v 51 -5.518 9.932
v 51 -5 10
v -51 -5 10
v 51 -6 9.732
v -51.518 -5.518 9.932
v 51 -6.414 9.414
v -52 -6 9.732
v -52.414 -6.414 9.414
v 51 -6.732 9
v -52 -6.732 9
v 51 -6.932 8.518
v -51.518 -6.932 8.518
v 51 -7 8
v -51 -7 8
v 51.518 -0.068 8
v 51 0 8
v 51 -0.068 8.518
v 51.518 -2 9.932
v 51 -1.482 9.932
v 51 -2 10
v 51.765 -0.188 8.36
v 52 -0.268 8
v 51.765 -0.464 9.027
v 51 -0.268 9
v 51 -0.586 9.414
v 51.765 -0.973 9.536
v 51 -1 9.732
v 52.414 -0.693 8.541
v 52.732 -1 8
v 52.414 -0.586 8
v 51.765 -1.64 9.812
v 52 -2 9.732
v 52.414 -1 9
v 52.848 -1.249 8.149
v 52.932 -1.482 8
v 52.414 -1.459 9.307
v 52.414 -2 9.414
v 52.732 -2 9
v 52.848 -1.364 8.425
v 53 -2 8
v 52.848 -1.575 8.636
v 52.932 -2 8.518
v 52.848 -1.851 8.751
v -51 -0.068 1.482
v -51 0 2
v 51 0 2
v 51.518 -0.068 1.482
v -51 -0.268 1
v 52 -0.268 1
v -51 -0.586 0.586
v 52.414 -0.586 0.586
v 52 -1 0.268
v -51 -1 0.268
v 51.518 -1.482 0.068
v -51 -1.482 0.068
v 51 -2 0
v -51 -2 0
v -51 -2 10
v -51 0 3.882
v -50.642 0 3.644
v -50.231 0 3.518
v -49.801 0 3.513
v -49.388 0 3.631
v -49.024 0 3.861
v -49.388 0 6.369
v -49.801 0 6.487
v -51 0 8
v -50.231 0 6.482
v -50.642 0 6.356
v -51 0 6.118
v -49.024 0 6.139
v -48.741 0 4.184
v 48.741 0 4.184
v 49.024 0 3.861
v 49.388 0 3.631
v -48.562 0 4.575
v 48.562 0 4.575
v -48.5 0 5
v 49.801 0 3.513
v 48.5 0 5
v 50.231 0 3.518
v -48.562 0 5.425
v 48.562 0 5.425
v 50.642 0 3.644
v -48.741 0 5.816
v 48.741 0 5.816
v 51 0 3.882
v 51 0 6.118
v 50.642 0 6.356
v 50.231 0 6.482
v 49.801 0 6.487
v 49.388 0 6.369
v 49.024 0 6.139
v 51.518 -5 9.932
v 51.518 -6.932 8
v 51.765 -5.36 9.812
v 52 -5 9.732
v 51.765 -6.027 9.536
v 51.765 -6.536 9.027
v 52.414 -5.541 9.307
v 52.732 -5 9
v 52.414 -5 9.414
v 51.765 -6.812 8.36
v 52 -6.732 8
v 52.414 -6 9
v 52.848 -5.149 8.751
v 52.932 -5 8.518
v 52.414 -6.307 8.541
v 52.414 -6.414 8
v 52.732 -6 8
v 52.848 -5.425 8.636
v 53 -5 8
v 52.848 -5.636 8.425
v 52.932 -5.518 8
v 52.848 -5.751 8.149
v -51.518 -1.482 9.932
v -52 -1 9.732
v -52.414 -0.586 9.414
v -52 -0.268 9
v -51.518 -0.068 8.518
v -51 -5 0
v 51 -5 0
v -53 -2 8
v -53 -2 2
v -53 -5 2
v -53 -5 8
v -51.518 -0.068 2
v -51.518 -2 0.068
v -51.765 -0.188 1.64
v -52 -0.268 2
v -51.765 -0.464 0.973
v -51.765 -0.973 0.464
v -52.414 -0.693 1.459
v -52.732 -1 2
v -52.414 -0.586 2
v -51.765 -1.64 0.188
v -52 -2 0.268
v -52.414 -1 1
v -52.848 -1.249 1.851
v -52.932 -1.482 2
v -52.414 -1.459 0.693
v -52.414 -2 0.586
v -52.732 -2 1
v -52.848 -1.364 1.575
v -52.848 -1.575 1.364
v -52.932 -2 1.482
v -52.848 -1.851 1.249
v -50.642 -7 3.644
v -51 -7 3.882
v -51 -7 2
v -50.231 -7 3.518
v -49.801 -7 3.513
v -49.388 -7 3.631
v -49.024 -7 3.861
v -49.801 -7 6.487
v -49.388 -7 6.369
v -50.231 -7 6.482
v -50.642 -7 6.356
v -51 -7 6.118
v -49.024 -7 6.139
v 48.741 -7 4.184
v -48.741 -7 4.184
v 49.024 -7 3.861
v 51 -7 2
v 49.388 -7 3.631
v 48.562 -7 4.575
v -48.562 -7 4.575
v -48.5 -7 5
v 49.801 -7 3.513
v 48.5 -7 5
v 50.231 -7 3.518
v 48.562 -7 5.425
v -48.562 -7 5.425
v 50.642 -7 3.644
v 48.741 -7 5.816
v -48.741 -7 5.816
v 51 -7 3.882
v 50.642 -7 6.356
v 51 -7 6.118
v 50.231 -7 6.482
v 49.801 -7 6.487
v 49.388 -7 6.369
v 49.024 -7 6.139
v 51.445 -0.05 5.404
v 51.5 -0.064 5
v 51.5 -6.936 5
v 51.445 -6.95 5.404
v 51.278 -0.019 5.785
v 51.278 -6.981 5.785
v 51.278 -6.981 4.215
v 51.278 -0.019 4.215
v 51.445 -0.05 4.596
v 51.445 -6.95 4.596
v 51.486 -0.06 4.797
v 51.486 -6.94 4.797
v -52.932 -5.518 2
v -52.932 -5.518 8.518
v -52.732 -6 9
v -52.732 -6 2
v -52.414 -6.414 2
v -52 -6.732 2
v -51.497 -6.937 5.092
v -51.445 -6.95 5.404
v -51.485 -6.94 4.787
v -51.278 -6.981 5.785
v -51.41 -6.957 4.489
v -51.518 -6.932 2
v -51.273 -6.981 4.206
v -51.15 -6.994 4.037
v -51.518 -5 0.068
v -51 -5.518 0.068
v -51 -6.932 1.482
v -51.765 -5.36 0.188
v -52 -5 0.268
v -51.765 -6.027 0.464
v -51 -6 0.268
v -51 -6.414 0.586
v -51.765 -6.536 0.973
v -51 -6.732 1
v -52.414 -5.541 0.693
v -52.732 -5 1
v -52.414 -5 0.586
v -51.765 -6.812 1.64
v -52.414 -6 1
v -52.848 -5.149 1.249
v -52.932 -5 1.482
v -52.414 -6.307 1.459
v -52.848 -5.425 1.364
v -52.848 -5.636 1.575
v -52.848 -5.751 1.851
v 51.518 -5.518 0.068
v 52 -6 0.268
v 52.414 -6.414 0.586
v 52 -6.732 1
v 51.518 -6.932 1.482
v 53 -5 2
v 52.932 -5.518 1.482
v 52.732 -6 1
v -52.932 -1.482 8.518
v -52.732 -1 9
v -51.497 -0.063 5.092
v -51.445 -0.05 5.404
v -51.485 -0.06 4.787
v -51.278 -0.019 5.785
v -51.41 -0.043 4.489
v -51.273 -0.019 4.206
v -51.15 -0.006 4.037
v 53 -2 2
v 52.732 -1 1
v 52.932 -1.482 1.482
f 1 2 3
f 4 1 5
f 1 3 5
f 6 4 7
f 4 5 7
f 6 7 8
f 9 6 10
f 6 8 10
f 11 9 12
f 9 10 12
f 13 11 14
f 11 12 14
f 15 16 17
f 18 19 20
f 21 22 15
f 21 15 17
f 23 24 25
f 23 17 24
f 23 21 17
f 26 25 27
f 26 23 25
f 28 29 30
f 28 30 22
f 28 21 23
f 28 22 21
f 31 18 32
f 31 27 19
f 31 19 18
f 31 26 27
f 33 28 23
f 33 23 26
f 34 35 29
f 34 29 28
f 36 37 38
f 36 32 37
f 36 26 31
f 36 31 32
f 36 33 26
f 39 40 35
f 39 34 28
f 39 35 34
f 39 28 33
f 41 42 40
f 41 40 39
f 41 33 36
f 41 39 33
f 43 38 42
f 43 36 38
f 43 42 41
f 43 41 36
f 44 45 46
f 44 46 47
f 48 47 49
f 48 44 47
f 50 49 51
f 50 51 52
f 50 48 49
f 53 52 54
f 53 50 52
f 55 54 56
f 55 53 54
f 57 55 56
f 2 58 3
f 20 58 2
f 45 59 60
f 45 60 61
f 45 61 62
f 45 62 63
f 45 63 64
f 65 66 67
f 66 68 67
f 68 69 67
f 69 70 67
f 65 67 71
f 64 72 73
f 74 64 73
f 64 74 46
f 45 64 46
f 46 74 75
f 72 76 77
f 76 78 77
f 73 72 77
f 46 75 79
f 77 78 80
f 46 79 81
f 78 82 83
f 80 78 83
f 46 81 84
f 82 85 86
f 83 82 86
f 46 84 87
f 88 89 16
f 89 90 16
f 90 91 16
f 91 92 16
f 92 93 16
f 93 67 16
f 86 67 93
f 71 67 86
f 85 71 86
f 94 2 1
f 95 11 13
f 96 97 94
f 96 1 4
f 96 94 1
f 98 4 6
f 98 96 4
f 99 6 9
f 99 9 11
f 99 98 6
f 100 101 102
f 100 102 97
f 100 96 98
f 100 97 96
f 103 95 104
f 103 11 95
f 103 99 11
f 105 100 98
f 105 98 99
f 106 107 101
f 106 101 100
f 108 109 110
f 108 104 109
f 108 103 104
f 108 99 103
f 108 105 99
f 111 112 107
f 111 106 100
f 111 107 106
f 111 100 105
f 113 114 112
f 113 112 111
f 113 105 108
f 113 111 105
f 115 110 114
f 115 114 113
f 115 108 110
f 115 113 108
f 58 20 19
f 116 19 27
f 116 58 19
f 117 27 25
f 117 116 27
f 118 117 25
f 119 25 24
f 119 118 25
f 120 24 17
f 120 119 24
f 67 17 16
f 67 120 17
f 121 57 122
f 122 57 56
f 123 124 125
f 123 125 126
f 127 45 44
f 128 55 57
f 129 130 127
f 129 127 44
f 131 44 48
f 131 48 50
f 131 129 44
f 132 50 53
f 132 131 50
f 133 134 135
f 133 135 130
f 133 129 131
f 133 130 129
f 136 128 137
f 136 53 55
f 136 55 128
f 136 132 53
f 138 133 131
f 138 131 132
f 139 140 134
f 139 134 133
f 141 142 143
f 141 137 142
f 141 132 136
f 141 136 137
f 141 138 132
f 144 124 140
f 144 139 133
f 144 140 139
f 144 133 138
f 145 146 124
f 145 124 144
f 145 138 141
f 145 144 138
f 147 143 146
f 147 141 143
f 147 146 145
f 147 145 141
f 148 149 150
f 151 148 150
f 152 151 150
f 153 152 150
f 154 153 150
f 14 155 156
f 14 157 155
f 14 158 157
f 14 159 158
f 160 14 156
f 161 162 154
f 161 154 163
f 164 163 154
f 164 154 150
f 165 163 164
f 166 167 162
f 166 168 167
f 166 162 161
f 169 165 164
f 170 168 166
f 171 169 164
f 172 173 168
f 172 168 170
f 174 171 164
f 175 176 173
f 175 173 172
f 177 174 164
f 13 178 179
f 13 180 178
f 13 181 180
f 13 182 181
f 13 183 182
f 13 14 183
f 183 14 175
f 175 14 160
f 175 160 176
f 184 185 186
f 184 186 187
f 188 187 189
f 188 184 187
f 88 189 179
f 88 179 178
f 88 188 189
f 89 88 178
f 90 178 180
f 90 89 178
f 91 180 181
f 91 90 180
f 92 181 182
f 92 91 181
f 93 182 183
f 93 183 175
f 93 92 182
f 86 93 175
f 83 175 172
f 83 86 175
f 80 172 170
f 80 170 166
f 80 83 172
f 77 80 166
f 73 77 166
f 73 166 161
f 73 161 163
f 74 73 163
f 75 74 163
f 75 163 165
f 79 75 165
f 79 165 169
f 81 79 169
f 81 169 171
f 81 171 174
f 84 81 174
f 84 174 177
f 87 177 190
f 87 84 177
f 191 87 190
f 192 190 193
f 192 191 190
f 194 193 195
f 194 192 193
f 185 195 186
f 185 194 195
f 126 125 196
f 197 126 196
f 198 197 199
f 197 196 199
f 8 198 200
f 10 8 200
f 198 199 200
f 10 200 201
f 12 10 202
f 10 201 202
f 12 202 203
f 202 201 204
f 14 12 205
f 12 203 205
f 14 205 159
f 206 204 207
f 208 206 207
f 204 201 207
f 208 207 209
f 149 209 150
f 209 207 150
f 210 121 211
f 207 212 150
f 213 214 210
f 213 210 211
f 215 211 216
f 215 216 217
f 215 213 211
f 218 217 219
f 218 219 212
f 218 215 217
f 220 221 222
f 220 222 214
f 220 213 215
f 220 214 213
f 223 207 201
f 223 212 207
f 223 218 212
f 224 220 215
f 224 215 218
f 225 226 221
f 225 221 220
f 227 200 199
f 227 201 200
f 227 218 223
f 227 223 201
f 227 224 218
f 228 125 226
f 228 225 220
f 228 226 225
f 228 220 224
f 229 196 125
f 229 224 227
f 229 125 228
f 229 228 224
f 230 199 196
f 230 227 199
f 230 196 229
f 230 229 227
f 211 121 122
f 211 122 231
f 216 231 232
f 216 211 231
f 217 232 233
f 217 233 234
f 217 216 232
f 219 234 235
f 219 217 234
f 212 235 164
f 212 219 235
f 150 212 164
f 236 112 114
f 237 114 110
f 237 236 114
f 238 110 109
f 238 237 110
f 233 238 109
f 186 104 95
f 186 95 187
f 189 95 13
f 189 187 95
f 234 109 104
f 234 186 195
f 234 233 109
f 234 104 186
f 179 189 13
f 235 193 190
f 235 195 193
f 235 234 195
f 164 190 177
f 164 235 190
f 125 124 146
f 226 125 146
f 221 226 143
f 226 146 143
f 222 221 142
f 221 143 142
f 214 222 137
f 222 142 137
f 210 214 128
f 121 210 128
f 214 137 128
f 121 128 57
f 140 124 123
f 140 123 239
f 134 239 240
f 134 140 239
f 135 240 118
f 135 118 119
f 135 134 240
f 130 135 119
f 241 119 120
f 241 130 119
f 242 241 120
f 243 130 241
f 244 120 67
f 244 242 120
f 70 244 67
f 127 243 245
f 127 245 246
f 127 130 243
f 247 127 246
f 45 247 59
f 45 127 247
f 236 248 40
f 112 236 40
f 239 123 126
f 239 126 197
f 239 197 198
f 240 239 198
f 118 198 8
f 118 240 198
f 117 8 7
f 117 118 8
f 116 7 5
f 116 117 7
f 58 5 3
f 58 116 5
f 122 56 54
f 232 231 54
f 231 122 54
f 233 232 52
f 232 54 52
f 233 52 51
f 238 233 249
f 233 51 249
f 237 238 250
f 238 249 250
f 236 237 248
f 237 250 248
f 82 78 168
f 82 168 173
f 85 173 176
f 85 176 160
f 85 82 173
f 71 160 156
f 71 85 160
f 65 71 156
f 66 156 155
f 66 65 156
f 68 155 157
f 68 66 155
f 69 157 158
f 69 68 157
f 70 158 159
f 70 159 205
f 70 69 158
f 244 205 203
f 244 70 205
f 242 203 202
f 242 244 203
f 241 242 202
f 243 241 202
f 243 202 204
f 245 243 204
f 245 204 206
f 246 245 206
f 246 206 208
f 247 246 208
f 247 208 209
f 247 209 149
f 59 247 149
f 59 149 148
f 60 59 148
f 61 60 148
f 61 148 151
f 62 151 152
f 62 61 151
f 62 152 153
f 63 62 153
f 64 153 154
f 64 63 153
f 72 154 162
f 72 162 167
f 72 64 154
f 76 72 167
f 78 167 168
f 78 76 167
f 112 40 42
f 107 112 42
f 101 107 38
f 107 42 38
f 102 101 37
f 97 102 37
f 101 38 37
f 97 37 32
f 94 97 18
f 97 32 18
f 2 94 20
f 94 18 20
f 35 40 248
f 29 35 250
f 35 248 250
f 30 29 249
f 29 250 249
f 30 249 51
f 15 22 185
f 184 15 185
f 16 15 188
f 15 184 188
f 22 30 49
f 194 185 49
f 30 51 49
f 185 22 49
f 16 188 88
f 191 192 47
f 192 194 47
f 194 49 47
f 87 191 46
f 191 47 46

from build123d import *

# Parameters (mm, degrees)
F0_W         = 106
F0_H         = 10
F0_R         = 1.5
F1_DEPTH     = 7
F2_T1_DEPTH  = 17
F2_T3_DEPTH  = 3
F2_T5_DEPTH  = 13
F2_T7_DEPTH  = 109
F2_S11_W     = 2
F2_S11_H     = 2
F2_T12_DEPTH = 2
F2_S17_W     = 2
F2_S17_H     = 2
F2_T18_DEPTH = 2
F3_T1_DEPTH  = 11
F3_T3_DEPTH  = 3
F3_T5_DEPTH  = 107
F3_S9_W      = 2.04
F3_S9_H      = 2.04
F3_T10_DEPTH = 2.04
F3_S15_W     = 2.04
F3_S15_H     = 2.04
F3_T16_DEPTH = 2.04


# Not quite as in the source:
# - a fillet or chamfer that OpenCascade refuses, or shapes differently, is made with other operations: its cross-section is extruded or revolved along the edge and cut away or added


with BuildPart() as f1:
    # F0 (on Front) → F1 (new body)
    with BuildSketch(Plane.XZ):
        with Locations((0, 5)):
            Rectangle(F0_W, F0_H)
        with Locations((-50, 5)):
            Circle(F0_R, mode=Mode.SUBTRACT)
        with Locations((50, 5)):
            Circle(F0_R, mode=Mode.SUBTRACT)
    extrude(amount=F1_DEPTH)

    # F2: fillet of radius 2 on 7 edges, made by hand

    # F2_s2 → F2_t1 (cut)
    with BuildSketch(Plane.XZ.offset(-5)):
        with BuildLine():
            ThreePointArc((51, 0), (52.4142135624, 0.5857864376), (53, 2))
            Line((53, 2), (53, 0))
            Line((53, 0), (51, 0))
        make_face()
        with BuildLine():
            ThreePointArc((-53, 8), (-52.4142135624, 9.4142135624), (-51, 10))
            Line((-51, 10), (-53, 10))
            Line((-53, 10), (-53, 8))
        make_face()
    extrude(amount=F2_T1_DEPTH, mode=Mode.SUBTRACT)

    # F2_s4 → F2_t3 (cut)
    with BuildSketch(Plane.XZ.offset(2)):
        with BuildLine():
            ThreePointArc((53, 8), (52.4142135624, 9.4142135624), (51, 10))
            Line((51, 10), (53, 10))
            Line((53, 10), (53, 8))
        make_face()
    extrude(amount=F2_T3_DEPTH, mode=Mode.SUBTRACT)

    # F2_s6 → F2_t5 (cut)
    with BuildSketch(Plane.XY.offset(-5)):
        with BuildLine():
            ThreePointArc((53, -2), (52.4142135624, -0.5857864376), (51, 0))
            Line((51, 0), (53, 0))
            Line((53, 0), (53, -2))
        make_face()
        with BuildLine():
            ThreePointArc((53, -5), (52.4142135624, -6.4142135624), (51, -7))
            Line((51, -7), (53, -7))
            Line((53, -7), (53, -5))
        make_face()
    extrude(amount=F2_T5_DEPTH, mode=Mode.SUBTRACT)

    # F2_s8 → F2_t7 (cut)
    with BuildSketch(Plane.YZ.offset(-58)):
        with BuildLine():
            ThreePointArc((-2, 10), (-0.5857864376, 9.4142135624), (0, 8))
            Line((0, 8), (0, 10))
            Line((0, 10), (-2, 10))
        make_face()
        with BuildLine():
            ThreePointArc((-5, 10), (-6.4142135624, 9.4142135624), (-7, 8))
            Line((-7, 8), (-7, 10))
            Line((-7, 10), (-5, 10))
        make_face()
    extrude(amount=F2_T7_DEPTH, mode=Mode.SUBTRACT)


with BuildPart() as f2_tool10:
    # F2_s11 → F2_t12 (new body)
    with BuildSketch(Plane.YZ.offset(51)):
        with Locations((-1, 9)):
            Rectangle(F2_S11_W, F2_S11_H)
    extrude(amount=F2_T12_DEPTH)

    # F2_s13 → F2_t14 (revolve, cut)
    with BuildSketch(Plane(origin=(51, -2, 8), x_dir=(0, -0.7071067812, -0.7071067812), z_dir=(0, -0.7071067812, 0.7071067812))):
        with BuildLine():
            ThreePointArc((0, -2), (2, 0), (0, 2))
            Line((0, 2), (0, -2))
        make_face()
    revolve(axis=Axis((51, -2, 8), (1, 0, 0)), mode=Mode.SUBTRACT)


with BuildPart() as f1_1:
    add(f1.part)

    # F2_t9: cut F2_tool10
    add(f2_tool10.part, mode=Mode.SUBTRACT)


with BuildPart() as f2_tool16:
    # F2_s17 → F2_t18 (new body)
    with BuildSketch(Plane.YZ.offset(51)):
        with Locations((-6, 9)):
            Rectangle(F2_S17_W, F2_S17_H)
    extrude(amount=F2_T18_DEPTH)

    # F2_s19 → F2_t20 (revolve, cut)
    with BuildSketch(Plane(origin=(51, -5, 8), x_dir=(0, 0.7071067812, -0.7071067812), z_dir=(0, -0.7071067812, -0.7071067812))):
        with BuildLine():
            ThreePointArc((0, -2), (2, 0), (0, 2))
            Line((0, 2), (0, -2))
        make_face()
    revolve(axis=Axis((51, -5, 8), (1, 0, 0)), mode=Mode.SUBTRACT)


with BuildPart() as f1_2:
    add(f1_1.part)

    # F2_t15: cut F2_tool16
    add(f2_tool16.part, mode=Mode.SUBTRACT)

    # F3: fillet of radius 2 on 7 edges, made by hand

    # F3_s2 → F3_t1 (cut)
    with BuildSketch(Plane.XY.offset(2)):
        with BuildLine():
            ThreePointArc((-53, -2), (-52.4142135624, -0.5857864376), (-51, 0))
            Line((-51, 0), (-53, 0))
            Line((-53, 0), (-53, -2))
        make_face()
        with BuildLine():
            ThreePointArc((-53, -5), (-52.4142135624, -6.4142135624), (-51, -7))
            Line((-51, -7), (-53, -7))
            Line((-53, -7), (-53, -5))
        make_face()
    extrude(amount=F3_T1_DEPTH, mode=Mode.SUBTRACT)

    # F3_s4 → F3_t3 (cut)
    with BuildSketch(Plane.XZ.offset(2)):
        with BuildLine():
            ThreePointArc((-53, 2), (-52.4142135624, 0.5857864376), (-51, 0))
            Line((-51, 0), (-53, 0))
            Line((-53, 0), (-53, 2))
        make_face()
    extrude(amount=F3_T3_DEPTH, mode=Mode.SUBTRACT)

    # F3_s6 → F3_t5 (cut)
    with BuildSketch(Plane.YZ.offset(-51)):
        with BuildLine():
            ThreePointArc((0, 2), (-0.5857864376, 0.5857864376), (-2, 0))
            Line((-2, 0), (0, 0))
            Line((0, 0), (0, 2))
        make_face()
        with BuildLine():
            ThreePointArc((-5, 0), (-6.4142135624, 0.5857864376), (-7, 2))
            Line((-7, 2), (-7, 0))
            Line((-7, 0), (-5, 0))
        make_face()
    extrude(amount=F3_T5_DEPTH, mode=Mode.SUBTRACT)


with BuildPart() as f3_tool8:
    # F3_s9 → F3_t10 (new body)
    with BuildSketch(Plane.YZ.offset(-51)):
        with Locations((-0.98, 0.98)):
            Rectangle(F3_S9_W, F3_S9_H)
    extrude(amount=-F3_T10_DEPTH)

    # F3_s11 → F3_t12 (revolve, cut)
    with BuildSketch(Plane(origin=(-51, -2, 2), x_dir=(0, -0.7071067812, 0.7071067812), z_dir=(0, -0.7071067812, -0.7071067812))):
        with BuildLine():
            ThreePointArc((0, -2), (2, 0), (0, 2))
            Line((0, 2), (0, -2))
        make_face()
    revolve(axis=Axis((-51, -2, 2), (-1, 0, 0)), mode=Mode.SUBTRACT)


with BuildPart() as f1_3:
    add(f1_2.part)

    # F3_t7: cut F3_tool8
    add(f3_tool8.part, mode=Mode.SUBTRACT)


with BuildPart() as f3_tool14:
    # F3_s15 → F3_t16 (new body)
    with BuildSketch(Plane.YZ.offset(-51)):
        with Locations((-6.02, 0.98)):
            Rectangle(F3_S15_W, F3_S15_H)
    extrude(amount=-F3_T16_DEPTH)

    # F3_s17 → F3_t18 (revolve, cut)
    with BuildSketch(Plane(origin=(-51, -5, 2), x_dir=(0, 0.7071067812, 0.7071067812), z_dir=(0, -0.7071067812, 0.7071067812))):
        with BuildLine():
            ThreePointArc((0, -2), (2, 0), (0, 2))
            Line((0, 2), (0, -2))
        make_face()
    revolve(axis=Axis((-51, -5, 2), (-1, 0, 0)), mode=Mode.SUBTRACT)


with BuildPart() as f1_4:
    add(f1_3.part)

    # F3_t13: cut F3_tool14
    add(f3_tool14.part, mode=Mode.SUBTRACT)


solid = f1_4.part
